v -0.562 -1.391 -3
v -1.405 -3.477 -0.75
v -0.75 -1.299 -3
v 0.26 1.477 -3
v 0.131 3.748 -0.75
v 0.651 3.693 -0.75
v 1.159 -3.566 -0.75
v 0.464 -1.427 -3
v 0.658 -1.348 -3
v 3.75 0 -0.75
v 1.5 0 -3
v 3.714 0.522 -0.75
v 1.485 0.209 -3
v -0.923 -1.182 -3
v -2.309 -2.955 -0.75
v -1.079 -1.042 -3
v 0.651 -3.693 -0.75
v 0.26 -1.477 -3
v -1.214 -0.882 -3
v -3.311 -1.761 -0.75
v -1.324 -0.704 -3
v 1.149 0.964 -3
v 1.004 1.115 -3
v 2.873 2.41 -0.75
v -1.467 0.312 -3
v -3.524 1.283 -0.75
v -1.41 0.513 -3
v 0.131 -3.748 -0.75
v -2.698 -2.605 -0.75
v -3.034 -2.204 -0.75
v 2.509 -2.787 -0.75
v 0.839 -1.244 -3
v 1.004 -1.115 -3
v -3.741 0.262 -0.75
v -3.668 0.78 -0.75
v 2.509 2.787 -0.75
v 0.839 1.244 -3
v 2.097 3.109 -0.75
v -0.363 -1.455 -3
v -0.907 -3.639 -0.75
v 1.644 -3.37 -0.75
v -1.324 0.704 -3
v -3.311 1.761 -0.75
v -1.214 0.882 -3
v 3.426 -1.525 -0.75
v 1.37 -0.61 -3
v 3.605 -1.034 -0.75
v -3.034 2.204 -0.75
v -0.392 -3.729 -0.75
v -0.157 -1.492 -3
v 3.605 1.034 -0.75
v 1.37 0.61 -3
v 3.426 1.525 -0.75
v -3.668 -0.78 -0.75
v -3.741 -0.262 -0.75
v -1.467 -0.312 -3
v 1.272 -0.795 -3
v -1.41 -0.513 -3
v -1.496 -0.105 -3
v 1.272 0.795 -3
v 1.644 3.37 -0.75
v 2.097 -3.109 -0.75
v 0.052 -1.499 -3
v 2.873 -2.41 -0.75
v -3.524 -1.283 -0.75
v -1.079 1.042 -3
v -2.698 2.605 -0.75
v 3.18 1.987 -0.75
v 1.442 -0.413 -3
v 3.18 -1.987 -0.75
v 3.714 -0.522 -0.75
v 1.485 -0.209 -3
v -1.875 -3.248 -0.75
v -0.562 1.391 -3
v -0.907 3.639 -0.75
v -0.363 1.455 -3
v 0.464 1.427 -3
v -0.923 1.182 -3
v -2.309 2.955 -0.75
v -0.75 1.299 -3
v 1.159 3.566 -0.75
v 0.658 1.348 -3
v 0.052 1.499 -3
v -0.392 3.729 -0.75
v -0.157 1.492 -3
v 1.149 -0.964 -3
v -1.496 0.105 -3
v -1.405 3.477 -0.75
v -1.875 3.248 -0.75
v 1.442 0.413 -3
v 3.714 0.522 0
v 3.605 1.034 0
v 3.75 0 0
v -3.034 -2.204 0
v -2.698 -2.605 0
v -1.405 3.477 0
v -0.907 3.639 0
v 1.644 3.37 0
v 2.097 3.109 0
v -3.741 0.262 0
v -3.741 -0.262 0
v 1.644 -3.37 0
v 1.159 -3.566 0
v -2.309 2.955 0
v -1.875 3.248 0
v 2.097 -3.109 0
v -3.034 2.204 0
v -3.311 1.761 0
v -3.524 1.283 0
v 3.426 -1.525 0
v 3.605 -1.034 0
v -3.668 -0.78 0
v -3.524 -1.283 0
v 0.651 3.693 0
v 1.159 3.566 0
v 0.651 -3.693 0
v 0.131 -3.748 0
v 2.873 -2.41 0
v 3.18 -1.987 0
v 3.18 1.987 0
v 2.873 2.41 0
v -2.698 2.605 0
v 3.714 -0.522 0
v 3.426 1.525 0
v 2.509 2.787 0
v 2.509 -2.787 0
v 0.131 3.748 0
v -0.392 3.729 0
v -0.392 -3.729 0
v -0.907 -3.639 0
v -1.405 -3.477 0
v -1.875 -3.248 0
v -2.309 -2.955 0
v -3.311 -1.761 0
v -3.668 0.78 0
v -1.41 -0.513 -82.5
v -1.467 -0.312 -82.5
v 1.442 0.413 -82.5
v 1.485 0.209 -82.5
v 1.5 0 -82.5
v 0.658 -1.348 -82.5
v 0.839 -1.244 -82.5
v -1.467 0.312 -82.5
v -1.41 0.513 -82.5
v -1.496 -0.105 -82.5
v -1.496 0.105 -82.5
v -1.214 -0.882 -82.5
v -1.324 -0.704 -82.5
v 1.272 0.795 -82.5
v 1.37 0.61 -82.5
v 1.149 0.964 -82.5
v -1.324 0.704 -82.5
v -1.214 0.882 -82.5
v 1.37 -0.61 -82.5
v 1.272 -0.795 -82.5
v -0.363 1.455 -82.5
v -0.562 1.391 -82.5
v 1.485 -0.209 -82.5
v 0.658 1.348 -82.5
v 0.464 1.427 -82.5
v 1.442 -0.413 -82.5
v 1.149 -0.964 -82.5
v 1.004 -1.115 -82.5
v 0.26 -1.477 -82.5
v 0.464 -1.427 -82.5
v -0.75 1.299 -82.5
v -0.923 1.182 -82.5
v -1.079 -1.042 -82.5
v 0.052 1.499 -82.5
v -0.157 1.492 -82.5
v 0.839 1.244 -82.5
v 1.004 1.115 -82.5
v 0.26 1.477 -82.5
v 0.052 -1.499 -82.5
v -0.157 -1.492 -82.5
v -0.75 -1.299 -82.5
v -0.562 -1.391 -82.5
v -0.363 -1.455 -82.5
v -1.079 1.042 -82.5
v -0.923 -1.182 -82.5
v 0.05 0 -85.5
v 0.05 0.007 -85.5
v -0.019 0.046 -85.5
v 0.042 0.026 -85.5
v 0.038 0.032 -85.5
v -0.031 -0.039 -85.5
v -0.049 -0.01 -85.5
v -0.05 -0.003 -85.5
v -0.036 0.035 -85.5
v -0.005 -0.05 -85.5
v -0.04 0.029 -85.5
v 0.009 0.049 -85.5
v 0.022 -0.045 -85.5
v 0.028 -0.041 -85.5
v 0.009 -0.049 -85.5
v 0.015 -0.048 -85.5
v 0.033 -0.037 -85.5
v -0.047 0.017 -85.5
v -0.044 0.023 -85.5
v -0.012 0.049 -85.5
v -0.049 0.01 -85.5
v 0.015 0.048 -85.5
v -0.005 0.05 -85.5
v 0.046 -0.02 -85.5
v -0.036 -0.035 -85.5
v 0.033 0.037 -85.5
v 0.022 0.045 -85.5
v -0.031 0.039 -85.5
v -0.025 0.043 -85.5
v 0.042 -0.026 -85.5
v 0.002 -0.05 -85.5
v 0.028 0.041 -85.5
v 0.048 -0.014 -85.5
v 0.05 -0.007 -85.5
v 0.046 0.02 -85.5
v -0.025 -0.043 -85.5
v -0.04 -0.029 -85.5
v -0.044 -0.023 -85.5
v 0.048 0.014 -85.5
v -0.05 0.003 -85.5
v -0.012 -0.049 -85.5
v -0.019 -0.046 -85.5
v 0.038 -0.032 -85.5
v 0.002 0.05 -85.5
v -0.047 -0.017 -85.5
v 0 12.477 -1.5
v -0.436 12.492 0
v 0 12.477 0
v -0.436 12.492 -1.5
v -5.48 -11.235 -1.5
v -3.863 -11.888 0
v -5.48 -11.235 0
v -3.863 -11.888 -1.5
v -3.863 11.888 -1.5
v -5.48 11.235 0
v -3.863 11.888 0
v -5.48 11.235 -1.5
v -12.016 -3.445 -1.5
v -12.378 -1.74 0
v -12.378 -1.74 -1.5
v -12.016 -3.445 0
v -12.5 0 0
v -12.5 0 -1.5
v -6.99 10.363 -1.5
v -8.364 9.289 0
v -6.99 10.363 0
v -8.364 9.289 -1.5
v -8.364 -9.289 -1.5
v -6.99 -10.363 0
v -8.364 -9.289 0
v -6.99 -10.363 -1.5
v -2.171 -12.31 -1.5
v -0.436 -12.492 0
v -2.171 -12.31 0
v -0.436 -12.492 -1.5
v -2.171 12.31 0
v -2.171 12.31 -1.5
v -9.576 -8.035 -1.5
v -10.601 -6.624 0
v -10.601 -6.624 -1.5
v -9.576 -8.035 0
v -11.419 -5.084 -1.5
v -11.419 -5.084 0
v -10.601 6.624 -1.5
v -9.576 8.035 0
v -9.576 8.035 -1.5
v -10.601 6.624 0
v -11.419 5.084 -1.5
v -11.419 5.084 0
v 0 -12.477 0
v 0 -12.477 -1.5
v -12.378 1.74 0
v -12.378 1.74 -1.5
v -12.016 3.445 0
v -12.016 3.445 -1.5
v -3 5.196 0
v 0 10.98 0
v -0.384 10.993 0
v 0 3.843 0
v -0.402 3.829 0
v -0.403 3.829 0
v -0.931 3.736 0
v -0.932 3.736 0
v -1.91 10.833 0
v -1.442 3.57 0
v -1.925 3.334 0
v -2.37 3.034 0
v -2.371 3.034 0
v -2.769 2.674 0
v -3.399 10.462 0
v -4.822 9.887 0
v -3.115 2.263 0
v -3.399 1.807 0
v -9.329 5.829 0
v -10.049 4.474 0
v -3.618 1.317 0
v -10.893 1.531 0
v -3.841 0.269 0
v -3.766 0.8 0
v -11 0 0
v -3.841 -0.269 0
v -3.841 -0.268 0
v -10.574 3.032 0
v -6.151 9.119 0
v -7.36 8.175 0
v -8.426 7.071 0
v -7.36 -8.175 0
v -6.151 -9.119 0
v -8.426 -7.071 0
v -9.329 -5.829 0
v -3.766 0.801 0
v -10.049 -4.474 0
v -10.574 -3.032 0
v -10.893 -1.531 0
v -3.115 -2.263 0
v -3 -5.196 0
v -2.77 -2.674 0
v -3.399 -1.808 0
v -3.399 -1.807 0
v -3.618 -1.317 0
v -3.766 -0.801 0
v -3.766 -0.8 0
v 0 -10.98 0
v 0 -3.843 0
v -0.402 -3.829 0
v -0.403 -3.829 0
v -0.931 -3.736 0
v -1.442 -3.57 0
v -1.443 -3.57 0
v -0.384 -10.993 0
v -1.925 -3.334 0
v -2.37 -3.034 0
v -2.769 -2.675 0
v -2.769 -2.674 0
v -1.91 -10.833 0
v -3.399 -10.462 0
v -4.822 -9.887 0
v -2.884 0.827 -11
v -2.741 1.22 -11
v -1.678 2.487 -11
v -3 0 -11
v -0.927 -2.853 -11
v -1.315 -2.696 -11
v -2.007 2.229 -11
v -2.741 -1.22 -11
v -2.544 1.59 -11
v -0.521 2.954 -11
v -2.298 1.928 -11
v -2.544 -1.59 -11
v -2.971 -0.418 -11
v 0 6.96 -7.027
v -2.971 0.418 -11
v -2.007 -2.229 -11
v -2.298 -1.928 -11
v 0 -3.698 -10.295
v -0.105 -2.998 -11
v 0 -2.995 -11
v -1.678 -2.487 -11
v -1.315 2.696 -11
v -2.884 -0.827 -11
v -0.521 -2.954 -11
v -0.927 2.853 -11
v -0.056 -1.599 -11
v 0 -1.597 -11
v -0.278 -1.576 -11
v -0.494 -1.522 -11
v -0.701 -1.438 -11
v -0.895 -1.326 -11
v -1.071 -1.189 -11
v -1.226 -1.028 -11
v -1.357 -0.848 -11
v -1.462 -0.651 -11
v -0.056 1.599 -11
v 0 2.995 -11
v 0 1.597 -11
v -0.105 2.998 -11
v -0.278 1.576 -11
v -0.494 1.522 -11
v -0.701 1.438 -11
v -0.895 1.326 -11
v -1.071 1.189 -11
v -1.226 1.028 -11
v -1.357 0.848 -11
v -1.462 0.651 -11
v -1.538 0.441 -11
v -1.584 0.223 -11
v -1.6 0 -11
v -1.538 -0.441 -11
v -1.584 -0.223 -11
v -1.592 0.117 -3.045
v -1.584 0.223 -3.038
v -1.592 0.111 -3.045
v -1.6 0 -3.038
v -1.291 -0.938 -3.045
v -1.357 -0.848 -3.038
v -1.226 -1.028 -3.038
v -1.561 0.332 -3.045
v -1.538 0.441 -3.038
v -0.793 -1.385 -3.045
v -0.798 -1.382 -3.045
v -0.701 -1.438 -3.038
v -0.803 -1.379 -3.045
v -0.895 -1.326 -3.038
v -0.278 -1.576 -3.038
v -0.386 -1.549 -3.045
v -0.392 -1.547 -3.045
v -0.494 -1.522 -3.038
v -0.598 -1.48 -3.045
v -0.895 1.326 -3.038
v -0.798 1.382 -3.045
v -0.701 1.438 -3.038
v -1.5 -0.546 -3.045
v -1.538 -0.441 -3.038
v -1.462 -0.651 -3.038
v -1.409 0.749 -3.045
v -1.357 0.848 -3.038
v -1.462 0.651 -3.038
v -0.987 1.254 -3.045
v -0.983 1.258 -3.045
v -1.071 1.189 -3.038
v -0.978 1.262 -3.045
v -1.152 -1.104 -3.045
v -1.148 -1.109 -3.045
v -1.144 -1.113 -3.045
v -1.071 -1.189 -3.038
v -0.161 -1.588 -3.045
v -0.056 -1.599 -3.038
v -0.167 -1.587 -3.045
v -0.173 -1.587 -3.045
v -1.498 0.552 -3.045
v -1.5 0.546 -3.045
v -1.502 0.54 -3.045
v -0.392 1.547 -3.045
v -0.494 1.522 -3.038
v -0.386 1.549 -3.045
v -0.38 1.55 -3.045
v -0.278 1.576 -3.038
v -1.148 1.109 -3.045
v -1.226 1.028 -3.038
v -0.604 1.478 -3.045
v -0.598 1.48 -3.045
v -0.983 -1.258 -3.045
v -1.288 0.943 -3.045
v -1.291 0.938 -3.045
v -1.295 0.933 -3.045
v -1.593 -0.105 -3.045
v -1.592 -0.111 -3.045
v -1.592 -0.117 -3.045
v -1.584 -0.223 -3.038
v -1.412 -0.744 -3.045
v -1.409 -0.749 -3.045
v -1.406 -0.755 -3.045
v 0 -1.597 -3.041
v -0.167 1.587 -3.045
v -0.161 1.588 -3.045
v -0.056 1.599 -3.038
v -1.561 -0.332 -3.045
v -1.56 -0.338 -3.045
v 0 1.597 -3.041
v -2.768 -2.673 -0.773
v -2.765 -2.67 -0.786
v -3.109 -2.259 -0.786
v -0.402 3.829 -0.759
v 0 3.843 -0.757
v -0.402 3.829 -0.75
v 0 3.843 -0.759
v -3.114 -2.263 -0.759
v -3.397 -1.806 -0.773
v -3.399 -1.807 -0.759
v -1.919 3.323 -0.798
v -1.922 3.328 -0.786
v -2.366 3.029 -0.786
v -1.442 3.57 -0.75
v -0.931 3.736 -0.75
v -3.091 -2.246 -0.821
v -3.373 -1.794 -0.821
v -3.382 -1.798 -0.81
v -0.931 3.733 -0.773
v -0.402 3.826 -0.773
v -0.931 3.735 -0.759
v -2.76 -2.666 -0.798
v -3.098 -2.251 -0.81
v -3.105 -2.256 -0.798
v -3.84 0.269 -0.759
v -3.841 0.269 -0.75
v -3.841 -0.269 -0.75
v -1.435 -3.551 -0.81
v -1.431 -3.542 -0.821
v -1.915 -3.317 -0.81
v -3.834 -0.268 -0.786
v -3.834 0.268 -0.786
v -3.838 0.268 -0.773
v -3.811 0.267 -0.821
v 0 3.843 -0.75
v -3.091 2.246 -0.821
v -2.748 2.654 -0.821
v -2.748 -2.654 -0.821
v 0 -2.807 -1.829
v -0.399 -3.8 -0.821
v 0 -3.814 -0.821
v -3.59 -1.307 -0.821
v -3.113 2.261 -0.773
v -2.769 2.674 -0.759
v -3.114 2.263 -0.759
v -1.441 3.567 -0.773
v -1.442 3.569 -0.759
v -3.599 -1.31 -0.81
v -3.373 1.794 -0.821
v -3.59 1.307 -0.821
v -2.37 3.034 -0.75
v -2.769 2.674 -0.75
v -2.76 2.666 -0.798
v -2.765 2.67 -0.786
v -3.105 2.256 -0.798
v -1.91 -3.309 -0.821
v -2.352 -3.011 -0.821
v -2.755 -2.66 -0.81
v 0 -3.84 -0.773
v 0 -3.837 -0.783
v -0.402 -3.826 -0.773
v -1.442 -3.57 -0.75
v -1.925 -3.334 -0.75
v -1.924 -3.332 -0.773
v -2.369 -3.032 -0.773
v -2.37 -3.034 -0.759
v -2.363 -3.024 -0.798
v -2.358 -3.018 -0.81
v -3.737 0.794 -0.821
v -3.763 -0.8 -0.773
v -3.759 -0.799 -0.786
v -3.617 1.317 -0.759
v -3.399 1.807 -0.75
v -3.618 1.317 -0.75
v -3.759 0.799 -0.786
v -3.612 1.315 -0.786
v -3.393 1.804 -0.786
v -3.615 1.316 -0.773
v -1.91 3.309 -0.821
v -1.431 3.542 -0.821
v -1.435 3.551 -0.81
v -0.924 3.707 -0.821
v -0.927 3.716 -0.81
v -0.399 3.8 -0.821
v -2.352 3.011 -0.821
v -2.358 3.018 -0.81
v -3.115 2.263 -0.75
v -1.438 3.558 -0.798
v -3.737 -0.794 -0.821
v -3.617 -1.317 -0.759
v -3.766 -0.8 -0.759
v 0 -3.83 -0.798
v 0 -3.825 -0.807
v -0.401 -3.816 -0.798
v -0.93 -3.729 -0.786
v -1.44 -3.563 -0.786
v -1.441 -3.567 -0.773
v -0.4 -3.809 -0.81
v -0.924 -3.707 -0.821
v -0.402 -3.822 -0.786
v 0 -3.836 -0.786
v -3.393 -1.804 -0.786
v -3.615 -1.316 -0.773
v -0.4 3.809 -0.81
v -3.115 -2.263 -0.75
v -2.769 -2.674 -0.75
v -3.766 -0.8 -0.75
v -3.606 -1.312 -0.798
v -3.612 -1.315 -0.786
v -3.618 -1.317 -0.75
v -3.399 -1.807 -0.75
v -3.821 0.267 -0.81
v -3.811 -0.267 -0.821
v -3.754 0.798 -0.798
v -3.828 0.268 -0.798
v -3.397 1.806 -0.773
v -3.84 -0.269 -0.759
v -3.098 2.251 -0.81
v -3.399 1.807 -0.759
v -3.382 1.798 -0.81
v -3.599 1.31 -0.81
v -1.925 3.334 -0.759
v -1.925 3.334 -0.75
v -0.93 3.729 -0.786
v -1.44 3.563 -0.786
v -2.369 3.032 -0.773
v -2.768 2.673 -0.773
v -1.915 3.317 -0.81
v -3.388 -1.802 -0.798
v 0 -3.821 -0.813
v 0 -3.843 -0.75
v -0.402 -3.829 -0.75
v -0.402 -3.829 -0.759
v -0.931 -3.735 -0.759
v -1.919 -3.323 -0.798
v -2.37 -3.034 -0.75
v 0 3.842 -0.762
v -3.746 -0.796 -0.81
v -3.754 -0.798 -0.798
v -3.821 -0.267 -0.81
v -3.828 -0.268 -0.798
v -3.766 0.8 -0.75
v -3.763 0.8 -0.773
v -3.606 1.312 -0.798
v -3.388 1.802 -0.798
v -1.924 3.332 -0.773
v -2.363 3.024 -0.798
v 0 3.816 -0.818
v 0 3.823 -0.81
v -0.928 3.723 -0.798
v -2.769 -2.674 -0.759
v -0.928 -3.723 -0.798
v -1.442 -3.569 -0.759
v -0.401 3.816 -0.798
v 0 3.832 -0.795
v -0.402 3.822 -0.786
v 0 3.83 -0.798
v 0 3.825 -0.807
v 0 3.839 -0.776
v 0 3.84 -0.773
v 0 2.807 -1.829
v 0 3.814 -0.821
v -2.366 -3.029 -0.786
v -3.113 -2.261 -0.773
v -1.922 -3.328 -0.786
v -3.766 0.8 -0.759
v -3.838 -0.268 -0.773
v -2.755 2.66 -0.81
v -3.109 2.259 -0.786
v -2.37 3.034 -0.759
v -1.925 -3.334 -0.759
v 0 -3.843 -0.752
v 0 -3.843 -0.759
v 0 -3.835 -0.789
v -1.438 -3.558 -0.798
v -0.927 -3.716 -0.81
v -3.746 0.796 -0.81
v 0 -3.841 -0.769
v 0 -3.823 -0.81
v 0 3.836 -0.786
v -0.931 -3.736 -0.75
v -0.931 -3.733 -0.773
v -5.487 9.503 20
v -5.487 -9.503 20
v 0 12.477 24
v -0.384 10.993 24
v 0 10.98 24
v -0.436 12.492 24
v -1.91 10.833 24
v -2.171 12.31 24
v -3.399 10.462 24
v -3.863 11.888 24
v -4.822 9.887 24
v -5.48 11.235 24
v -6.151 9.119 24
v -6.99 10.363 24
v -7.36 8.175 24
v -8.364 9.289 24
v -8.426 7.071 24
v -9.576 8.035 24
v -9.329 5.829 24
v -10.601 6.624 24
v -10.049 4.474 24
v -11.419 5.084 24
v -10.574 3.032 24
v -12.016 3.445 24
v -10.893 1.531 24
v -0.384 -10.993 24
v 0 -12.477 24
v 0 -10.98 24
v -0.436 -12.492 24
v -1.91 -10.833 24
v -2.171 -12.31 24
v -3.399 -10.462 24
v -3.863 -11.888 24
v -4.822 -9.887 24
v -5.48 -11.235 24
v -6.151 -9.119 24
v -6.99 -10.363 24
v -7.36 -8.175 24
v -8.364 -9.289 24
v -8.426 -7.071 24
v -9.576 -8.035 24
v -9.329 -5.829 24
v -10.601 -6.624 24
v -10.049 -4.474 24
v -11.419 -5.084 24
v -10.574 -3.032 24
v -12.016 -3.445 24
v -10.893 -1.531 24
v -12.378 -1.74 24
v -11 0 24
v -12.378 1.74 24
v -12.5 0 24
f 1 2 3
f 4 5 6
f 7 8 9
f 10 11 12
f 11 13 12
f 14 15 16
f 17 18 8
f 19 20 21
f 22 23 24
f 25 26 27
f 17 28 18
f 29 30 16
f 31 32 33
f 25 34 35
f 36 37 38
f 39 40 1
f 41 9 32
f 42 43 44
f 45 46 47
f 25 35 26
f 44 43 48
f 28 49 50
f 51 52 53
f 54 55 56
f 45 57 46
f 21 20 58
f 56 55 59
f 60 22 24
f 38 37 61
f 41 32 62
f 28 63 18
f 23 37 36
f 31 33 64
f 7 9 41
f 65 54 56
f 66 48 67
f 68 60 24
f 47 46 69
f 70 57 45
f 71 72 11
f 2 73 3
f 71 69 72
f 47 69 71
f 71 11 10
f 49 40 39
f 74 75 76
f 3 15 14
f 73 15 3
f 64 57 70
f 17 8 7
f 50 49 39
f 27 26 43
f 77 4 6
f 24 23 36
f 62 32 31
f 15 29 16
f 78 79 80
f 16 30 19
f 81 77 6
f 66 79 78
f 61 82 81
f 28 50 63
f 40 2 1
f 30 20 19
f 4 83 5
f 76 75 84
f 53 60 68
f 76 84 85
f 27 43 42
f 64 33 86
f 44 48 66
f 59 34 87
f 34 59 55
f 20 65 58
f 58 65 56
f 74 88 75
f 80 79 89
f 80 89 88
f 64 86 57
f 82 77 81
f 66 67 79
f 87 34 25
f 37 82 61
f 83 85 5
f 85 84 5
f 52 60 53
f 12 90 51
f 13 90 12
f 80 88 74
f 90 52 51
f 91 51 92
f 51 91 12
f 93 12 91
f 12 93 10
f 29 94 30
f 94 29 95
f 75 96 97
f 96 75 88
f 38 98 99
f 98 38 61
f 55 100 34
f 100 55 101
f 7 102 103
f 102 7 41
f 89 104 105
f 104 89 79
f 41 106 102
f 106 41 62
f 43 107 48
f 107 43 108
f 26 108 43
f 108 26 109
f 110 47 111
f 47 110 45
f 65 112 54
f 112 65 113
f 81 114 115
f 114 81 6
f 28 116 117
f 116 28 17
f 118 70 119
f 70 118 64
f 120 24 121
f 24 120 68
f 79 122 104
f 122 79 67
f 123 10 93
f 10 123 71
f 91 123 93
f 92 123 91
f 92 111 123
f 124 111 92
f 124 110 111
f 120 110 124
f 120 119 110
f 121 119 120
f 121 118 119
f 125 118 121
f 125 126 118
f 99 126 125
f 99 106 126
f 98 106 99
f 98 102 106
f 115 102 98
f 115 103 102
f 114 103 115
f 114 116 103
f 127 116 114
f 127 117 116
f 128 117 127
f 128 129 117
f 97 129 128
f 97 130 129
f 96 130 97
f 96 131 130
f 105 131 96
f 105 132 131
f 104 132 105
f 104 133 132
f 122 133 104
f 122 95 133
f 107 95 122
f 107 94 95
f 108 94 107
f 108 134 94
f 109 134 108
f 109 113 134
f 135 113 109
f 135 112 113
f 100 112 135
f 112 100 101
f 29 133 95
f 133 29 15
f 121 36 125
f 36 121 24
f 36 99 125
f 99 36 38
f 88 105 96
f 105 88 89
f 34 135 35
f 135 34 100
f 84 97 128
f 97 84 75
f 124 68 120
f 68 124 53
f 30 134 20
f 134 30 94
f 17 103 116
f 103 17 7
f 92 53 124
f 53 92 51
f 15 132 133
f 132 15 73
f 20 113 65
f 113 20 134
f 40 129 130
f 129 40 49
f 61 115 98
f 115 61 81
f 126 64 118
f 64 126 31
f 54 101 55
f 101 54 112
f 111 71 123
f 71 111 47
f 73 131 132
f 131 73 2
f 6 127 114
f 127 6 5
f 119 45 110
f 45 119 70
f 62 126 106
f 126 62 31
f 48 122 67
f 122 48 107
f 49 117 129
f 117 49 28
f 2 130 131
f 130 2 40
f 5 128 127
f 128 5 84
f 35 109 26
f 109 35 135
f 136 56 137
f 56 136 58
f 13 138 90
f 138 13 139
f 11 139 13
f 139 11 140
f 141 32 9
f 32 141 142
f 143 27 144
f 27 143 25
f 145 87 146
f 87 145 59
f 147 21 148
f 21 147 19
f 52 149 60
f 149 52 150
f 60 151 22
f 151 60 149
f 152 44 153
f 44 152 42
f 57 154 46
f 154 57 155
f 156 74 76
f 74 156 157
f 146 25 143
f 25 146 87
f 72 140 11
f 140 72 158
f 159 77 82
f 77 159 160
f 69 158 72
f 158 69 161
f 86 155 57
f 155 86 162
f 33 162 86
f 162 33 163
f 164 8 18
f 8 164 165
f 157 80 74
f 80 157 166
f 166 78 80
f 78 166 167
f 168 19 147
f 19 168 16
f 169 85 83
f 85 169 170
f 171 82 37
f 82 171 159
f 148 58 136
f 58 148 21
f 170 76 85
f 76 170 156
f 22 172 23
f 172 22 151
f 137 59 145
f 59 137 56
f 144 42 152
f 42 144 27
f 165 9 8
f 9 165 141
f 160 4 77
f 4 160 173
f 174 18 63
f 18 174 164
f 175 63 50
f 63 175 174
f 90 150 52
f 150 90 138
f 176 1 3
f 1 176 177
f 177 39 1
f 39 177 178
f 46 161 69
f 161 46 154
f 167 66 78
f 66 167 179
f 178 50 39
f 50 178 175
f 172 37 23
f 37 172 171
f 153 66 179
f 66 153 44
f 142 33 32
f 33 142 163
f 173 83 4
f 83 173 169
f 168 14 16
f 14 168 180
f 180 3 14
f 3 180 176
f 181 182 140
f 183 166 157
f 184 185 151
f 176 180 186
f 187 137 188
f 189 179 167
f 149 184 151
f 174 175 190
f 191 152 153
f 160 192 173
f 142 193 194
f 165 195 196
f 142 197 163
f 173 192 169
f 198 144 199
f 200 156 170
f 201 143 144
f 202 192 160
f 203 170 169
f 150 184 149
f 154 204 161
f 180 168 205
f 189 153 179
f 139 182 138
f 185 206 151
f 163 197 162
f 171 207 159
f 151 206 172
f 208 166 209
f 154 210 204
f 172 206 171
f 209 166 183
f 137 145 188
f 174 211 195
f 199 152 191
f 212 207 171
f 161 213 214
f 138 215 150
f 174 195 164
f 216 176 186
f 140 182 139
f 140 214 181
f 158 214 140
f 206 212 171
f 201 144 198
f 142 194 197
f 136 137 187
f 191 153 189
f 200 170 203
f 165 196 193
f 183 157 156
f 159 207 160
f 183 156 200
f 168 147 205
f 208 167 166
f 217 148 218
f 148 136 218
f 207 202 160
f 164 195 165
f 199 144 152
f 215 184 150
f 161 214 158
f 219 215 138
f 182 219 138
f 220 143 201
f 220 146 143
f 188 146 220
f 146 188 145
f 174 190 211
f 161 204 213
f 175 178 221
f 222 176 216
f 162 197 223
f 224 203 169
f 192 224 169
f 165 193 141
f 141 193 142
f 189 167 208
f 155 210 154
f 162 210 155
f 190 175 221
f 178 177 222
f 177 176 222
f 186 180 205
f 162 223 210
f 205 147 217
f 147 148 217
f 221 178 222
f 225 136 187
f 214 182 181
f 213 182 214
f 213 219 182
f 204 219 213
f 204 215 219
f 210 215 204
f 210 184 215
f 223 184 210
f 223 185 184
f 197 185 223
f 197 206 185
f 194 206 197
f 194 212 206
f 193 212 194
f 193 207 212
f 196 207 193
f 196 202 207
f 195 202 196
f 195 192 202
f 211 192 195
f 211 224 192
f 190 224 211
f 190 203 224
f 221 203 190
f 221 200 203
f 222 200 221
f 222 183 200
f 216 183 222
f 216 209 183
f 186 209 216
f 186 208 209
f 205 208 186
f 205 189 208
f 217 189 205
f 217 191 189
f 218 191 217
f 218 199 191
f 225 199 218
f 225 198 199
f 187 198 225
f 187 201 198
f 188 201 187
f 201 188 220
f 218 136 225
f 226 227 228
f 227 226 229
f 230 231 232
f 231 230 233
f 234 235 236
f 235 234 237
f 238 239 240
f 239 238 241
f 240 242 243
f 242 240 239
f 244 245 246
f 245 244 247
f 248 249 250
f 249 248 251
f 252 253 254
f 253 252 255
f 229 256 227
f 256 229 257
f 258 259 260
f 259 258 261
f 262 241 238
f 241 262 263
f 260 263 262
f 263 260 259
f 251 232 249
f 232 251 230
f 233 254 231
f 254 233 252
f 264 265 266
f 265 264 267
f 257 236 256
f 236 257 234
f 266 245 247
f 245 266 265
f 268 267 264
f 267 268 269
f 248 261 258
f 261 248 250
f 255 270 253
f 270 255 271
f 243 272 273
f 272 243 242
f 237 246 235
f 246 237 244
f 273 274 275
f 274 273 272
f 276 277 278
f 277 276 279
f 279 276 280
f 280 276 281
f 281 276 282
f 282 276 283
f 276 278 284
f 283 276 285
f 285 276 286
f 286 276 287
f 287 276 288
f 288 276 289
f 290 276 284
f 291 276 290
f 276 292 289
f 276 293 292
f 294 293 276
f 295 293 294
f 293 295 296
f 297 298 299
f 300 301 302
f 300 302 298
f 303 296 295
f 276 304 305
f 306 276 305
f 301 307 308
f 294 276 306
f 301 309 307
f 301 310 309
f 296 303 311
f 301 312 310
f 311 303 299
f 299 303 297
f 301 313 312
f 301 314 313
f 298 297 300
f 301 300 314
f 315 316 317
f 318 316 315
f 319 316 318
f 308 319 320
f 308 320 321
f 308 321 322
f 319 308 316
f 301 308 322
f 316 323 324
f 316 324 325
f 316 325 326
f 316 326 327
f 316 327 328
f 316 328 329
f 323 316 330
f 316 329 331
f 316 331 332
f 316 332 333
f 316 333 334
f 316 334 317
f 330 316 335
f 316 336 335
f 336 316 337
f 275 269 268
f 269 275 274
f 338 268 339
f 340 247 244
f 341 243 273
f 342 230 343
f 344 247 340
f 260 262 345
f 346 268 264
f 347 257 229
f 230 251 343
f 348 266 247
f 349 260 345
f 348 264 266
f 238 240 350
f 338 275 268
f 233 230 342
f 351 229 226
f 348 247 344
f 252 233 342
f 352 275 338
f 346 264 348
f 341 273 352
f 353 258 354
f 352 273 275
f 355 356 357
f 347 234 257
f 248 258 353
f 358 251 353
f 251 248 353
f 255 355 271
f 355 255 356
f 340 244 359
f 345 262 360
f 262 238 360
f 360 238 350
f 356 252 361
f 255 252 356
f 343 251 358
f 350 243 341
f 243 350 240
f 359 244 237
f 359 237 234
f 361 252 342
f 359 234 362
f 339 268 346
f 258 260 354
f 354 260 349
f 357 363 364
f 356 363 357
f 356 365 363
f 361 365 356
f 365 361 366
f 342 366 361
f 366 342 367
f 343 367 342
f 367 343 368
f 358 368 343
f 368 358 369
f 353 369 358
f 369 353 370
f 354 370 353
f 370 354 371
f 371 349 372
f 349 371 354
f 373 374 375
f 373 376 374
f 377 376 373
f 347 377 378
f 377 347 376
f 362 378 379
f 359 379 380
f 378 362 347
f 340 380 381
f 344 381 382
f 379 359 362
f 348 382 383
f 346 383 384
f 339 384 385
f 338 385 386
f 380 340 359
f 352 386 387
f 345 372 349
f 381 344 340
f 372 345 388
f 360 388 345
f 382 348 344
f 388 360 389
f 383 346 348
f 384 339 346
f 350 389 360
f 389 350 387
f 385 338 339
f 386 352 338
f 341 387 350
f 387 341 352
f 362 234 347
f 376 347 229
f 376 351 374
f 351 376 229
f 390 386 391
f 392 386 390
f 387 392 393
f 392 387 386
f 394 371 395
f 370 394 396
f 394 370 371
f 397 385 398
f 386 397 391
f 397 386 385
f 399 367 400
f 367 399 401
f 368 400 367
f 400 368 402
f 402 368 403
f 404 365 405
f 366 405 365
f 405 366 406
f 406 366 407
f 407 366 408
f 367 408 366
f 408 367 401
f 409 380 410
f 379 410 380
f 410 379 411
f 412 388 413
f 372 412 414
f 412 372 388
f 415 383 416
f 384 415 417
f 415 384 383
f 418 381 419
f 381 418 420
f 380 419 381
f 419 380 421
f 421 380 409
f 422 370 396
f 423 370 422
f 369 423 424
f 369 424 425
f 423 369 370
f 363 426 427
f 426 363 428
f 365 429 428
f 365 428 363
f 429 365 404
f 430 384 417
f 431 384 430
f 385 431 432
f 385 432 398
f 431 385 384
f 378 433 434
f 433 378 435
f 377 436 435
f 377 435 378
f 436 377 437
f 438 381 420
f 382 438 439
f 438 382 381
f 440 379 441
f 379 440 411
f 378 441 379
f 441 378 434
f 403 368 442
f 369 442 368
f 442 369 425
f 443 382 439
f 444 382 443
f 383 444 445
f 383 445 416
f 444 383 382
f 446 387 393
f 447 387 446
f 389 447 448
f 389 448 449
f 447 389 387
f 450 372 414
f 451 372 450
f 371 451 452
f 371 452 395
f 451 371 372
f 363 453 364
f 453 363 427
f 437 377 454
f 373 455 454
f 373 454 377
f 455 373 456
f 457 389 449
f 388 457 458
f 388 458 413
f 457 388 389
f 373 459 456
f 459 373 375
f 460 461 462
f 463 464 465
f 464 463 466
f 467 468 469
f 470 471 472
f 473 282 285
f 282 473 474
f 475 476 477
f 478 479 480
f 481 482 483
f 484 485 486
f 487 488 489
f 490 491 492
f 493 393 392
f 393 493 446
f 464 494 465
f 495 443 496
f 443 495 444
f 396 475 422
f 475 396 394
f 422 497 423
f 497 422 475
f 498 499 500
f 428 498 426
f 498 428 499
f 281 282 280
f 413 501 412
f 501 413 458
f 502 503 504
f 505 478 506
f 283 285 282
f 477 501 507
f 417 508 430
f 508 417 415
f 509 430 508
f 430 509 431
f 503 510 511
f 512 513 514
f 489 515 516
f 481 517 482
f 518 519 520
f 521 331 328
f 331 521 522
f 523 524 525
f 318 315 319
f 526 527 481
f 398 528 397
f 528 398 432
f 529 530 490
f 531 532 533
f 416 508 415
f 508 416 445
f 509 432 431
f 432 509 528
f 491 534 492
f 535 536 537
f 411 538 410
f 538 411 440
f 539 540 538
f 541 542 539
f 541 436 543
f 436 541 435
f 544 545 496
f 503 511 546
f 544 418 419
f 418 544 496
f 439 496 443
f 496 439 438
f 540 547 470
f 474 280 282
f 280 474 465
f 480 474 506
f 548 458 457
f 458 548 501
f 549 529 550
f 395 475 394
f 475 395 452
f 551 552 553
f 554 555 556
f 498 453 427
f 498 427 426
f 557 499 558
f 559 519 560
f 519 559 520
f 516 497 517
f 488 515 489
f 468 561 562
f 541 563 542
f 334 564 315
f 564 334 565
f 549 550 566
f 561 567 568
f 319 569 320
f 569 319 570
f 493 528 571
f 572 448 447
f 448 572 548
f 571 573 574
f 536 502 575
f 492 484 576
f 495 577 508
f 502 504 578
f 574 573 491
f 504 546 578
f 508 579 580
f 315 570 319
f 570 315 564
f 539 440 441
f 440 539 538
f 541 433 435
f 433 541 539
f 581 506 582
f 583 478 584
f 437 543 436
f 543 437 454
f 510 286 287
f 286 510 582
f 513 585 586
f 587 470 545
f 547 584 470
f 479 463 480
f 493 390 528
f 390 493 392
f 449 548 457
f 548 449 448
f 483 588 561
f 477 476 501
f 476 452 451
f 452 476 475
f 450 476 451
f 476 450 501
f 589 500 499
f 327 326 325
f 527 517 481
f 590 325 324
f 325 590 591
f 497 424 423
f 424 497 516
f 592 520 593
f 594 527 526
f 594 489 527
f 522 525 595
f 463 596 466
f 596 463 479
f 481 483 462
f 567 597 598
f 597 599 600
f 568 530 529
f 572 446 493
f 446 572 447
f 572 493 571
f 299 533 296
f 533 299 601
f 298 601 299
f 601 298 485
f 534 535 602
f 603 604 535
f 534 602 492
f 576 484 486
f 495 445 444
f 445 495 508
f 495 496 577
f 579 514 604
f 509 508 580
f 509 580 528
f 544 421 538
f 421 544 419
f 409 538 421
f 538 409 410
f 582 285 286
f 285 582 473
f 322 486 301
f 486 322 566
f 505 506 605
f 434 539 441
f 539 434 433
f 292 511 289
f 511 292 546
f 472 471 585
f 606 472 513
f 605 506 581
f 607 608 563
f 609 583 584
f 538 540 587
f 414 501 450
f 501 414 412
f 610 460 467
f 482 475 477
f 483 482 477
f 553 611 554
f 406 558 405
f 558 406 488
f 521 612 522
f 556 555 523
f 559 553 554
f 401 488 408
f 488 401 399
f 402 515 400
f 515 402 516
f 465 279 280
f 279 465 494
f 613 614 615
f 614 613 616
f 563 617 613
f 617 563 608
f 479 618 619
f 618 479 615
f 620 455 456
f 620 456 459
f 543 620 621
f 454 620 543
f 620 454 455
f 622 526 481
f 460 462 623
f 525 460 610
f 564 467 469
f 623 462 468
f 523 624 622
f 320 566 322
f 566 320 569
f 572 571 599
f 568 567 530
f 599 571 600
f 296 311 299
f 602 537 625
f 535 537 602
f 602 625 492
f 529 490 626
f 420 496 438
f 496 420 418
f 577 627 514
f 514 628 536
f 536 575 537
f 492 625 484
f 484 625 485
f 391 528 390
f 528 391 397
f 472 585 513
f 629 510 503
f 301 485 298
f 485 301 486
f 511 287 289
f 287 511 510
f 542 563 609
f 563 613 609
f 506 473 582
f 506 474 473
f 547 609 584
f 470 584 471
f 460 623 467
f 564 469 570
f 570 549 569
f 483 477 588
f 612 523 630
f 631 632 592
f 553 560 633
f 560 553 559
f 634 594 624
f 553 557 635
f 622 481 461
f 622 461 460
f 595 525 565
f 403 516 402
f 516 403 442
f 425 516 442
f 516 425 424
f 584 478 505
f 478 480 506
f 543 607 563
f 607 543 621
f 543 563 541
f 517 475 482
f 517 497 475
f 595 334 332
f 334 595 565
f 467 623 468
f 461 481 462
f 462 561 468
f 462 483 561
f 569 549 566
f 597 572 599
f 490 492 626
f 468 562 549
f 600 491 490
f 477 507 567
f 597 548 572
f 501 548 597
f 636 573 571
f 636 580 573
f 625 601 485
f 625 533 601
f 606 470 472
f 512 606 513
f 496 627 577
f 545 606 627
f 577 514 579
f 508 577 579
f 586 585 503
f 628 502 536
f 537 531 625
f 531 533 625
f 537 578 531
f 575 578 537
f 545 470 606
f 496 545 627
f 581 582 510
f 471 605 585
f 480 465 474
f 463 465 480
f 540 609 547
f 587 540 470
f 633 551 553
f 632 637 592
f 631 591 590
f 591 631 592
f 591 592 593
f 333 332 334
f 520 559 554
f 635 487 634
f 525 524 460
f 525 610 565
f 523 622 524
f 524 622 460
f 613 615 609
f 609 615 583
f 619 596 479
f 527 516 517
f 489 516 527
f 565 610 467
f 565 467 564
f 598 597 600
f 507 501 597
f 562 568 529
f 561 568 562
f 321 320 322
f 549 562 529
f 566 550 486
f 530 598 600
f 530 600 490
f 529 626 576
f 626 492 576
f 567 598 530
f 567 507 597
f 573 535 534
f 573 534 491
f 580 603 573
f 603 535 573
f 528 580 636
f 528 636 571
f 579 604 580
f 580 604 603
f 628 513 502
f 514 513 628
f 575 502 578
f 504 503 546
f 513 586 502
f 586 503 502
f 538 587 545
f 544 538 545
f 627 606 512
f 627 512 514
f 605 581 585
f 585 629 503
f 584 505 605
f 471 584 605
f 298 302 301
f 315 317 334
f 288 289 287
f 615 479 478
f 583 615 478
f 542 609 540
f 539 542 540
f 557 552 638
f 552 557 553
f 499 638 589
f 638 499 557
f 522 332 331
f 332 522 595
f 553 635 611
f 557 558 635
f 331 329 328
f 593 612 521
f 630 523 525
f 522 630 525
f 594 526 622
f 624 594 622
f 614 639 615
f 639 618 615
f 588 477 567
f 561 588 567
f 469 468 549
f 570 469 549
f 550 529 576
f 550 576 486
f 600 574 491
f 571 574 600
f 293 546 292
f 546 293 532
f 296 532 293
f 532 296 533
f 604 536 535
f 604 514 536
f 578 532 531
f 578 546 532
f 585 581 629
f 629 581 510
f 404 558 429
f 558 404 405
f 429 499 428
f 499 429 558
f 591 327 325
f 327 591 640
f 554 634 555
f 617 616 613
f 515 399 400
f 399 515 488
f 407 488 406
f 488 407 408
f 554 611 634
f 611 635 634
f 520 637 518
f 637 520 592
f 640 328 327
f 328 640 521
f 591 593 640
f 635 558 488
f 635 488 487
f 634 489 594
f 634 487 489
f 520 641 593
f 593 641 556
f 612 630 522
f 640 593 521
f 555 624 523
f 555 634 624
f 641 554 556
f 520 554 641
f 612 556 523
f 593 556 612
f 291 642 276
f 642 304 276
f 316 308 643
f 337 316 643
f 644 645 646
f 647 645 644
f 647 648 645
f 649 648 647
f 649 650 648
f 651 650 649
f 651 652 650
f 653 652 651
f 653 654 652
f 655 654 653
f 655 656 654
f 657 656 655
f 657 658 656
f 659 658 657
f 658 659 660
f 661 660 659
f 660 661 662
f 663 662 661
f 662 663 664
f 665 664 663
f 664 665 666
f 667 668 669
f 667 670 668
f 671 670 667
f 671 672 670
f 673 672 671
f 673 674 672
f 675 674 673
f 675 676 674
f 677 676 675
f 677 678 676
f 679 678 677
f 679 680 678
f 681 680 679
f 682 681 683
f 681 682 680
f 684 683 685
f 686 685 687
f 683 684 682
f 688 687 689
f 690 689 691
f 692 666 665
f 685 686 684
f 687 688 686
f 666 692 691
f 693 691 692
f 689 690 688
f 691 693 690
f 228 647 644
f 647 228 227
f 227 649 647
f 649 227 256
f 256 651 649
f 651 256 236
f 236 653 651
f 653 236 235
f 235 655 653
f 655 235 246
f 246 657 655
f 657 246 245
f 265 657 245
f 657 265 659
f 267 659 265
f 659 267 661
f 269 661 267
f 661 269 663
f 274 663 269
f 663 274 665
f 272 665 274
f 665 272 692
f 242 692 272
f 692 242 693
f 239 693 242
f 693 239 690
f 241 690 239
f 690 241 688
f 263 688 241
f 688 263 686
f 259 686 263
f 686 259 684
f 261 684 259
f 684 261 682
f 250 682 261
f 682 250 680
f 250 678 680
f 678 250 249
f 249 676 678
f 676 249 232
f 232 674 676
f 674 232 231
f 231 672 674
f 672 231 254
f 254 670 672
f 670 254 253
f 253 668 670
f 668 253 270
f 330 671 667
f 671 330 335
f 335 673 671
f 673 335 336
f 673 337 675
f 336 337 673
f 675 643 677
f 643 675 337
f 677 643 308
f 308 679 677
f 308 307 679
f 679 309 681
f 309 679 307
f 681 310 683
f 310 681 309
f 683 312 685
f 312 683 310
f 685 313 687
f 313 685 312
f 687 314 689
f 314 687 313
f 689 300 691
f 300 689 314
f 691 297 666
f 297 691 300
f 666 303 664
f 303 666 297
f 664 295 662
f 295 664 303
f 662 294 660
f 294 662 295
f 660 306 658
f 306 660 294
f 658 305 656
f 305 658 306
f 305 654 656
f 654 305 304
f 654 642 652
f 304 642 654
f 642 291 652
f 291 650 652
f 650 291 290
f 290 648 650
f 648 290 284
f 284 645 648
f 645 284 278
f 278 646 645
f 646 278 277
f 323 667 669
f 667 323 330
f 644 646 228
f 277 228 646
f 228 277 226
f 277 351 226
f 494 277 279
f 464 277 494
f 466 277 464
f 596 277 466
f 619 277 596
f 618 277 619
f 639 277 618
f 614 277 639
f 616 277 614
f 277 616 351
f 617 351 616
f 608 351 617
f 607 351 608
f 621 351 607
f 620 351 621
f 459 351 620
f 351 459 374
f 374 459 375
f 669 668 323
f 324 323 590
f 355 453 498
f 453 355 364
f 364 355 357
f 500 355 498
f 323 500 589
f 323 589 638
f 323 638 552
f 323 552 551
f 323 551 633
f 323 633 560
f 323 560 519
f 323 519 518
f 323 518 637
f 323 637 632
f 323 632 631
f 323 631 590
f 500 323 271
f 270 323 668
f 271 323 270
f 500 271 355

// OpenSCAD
// adapt Nail to a candle

/* [Nail] */
nailDia=3; //shaft dia
nailLen=82.5; //Length (just for display)
nailHdDia=7.5; //Diameater of the Head
nailHdThck=3; //Thickness of the head
nailHdCntSnk=true; //Countersunk?
/* [candle] */
cndlDia=23; //Diameter of the Candle
cndlLen=150; //Lenght of the candle (just for Display)

/* [Properties] */
minWallThck=1.5; //minimum Wall Thickness
slvHght=24; //Length of the sleeve
ripsCnt=3; //How many rips in the sleeve
ripsHght=20;
ripsWdth=5;
cndlSpcng=-0.5; //spacing between candle and sleeve
nailSpcng=0.1; //spacing between nail and adapter


/* [show] */
showNail=true;
showAdapter=true;
showSection=true;

/* [Hidden] */
slvOutDia=cndlDia+(cndlSpcng+minWallThck)*2;
slvInDia=cndlDia+cndlSpcng*2;
botDia=nailDia+minWallThck*2;
botHght=(slvOutDia-botDia)/2;
$fn=ripsCnt*15; //facets (influences also rips)
fudge=0.1;


 
if (showNail)
 translate([0,0,-nailHdThck]) color("silver") nail();

if (showAdapter)
  difference(){
    color("olive") adapter();
    if (showSection) 
      translate([slvOutDia/4+fudge/2,0,(slvHght-botHght-minWallThck)/2]) 
        cube([slvOutDia/2+fudge,slvOutDia+fudge,slvHght+botHght+minWallThck+fudge],true);
}
  
module nail(){
  
  translate([0,0,-nailLen+nailDia]) cylinder(d=nailDia,h=nailLen-nailDia);
  translate([0,0,-nailLen]) cylinder(d1=0.1,d2=nailDia,h=nailDia);
  nailHead();
  
}

*nailHead(true);
module nailHead(cut=false){
  if (cut)
    translate([0,0,-nailSpcng]) rotate_extrude() 
      intersection(){
        translate([0,nailSpcng]) offset(nailSpcng) projection() rotate([-90,0,0]) nailHead(false);
        square([nailHdDia/2+fudge+nailSpcng,nailHdThck+fudge+nailSpcng*2]);
      }
  else{
    if (nailHdCntSnk){
      coneHght=(nailHdDia-nailDia)/2;
      cylinder(d1=nailDia,d2=nailHdDia,h=coneHght);
      translate([0,0,coneHght]) cylinder(d=nailHdDia,h=nailHdThck-coneHght);
    }
    else
      cylinder(d=nailHdDia,h=nailHdThck);
  }
}

*adapter();
module adapter(){
  ripAng=360/$fn;
  ripBaseLen=2*slvInDia/2*sin(ripAng/2);
  ripAlt=1/2*sqrt(4*pow(slvInDia/2,2)-pow(ripBaseLen,2));//altitude of the isosceles triangle
  echo(ripAng,ripBaseLen,ripAlt,slvInDia/2);
  
  //sleeve
  rotate(ripAng/2) linear_extrude(slvHght) difference(){
    circle(d=slvOutDia);
    circle(d=slvInDia);
  }
  //bottom
  rotate(ripAng/2) difference(){
    translate([0,0,-minWallThck]){
      cylinder(d=slvOutDia,h=minWallThck);
      translate([0,0,-botHght]) cylinder(d1=botDia,d2=slvOutDia,h=botHght);
    }
    //drill
    translate([0,0,-botHght-minWallThck-fudge/2]) cylinder(d=nailDia+nailSpcng*2,h=botHght+minWallThck+fudge);
    //nail head
    if (nailHdCntSnk)
      translate([0,0,-nailHdThck]) nailHead(true);
    else
      cylinder(d=nailHdDia,h=nailHdThck);
  }
  
  //rips
  polyVerts=[[slvInDia/2-ripsWdth,0,0],[ripAlt,-ripBaseLen/2,0],[ripAlt,ripBaseLen/2,0],[ripAlt,0,ripsHght]];
  polyFaces=[[0,1,2],[1,3,2],[0,3,1],[0,2,3]];
  
  for (i=[0:ripsCnt-1])
    rotate(i*(360/ripsCnt)) polyhedron(polyVerts,polyFaces);
}
